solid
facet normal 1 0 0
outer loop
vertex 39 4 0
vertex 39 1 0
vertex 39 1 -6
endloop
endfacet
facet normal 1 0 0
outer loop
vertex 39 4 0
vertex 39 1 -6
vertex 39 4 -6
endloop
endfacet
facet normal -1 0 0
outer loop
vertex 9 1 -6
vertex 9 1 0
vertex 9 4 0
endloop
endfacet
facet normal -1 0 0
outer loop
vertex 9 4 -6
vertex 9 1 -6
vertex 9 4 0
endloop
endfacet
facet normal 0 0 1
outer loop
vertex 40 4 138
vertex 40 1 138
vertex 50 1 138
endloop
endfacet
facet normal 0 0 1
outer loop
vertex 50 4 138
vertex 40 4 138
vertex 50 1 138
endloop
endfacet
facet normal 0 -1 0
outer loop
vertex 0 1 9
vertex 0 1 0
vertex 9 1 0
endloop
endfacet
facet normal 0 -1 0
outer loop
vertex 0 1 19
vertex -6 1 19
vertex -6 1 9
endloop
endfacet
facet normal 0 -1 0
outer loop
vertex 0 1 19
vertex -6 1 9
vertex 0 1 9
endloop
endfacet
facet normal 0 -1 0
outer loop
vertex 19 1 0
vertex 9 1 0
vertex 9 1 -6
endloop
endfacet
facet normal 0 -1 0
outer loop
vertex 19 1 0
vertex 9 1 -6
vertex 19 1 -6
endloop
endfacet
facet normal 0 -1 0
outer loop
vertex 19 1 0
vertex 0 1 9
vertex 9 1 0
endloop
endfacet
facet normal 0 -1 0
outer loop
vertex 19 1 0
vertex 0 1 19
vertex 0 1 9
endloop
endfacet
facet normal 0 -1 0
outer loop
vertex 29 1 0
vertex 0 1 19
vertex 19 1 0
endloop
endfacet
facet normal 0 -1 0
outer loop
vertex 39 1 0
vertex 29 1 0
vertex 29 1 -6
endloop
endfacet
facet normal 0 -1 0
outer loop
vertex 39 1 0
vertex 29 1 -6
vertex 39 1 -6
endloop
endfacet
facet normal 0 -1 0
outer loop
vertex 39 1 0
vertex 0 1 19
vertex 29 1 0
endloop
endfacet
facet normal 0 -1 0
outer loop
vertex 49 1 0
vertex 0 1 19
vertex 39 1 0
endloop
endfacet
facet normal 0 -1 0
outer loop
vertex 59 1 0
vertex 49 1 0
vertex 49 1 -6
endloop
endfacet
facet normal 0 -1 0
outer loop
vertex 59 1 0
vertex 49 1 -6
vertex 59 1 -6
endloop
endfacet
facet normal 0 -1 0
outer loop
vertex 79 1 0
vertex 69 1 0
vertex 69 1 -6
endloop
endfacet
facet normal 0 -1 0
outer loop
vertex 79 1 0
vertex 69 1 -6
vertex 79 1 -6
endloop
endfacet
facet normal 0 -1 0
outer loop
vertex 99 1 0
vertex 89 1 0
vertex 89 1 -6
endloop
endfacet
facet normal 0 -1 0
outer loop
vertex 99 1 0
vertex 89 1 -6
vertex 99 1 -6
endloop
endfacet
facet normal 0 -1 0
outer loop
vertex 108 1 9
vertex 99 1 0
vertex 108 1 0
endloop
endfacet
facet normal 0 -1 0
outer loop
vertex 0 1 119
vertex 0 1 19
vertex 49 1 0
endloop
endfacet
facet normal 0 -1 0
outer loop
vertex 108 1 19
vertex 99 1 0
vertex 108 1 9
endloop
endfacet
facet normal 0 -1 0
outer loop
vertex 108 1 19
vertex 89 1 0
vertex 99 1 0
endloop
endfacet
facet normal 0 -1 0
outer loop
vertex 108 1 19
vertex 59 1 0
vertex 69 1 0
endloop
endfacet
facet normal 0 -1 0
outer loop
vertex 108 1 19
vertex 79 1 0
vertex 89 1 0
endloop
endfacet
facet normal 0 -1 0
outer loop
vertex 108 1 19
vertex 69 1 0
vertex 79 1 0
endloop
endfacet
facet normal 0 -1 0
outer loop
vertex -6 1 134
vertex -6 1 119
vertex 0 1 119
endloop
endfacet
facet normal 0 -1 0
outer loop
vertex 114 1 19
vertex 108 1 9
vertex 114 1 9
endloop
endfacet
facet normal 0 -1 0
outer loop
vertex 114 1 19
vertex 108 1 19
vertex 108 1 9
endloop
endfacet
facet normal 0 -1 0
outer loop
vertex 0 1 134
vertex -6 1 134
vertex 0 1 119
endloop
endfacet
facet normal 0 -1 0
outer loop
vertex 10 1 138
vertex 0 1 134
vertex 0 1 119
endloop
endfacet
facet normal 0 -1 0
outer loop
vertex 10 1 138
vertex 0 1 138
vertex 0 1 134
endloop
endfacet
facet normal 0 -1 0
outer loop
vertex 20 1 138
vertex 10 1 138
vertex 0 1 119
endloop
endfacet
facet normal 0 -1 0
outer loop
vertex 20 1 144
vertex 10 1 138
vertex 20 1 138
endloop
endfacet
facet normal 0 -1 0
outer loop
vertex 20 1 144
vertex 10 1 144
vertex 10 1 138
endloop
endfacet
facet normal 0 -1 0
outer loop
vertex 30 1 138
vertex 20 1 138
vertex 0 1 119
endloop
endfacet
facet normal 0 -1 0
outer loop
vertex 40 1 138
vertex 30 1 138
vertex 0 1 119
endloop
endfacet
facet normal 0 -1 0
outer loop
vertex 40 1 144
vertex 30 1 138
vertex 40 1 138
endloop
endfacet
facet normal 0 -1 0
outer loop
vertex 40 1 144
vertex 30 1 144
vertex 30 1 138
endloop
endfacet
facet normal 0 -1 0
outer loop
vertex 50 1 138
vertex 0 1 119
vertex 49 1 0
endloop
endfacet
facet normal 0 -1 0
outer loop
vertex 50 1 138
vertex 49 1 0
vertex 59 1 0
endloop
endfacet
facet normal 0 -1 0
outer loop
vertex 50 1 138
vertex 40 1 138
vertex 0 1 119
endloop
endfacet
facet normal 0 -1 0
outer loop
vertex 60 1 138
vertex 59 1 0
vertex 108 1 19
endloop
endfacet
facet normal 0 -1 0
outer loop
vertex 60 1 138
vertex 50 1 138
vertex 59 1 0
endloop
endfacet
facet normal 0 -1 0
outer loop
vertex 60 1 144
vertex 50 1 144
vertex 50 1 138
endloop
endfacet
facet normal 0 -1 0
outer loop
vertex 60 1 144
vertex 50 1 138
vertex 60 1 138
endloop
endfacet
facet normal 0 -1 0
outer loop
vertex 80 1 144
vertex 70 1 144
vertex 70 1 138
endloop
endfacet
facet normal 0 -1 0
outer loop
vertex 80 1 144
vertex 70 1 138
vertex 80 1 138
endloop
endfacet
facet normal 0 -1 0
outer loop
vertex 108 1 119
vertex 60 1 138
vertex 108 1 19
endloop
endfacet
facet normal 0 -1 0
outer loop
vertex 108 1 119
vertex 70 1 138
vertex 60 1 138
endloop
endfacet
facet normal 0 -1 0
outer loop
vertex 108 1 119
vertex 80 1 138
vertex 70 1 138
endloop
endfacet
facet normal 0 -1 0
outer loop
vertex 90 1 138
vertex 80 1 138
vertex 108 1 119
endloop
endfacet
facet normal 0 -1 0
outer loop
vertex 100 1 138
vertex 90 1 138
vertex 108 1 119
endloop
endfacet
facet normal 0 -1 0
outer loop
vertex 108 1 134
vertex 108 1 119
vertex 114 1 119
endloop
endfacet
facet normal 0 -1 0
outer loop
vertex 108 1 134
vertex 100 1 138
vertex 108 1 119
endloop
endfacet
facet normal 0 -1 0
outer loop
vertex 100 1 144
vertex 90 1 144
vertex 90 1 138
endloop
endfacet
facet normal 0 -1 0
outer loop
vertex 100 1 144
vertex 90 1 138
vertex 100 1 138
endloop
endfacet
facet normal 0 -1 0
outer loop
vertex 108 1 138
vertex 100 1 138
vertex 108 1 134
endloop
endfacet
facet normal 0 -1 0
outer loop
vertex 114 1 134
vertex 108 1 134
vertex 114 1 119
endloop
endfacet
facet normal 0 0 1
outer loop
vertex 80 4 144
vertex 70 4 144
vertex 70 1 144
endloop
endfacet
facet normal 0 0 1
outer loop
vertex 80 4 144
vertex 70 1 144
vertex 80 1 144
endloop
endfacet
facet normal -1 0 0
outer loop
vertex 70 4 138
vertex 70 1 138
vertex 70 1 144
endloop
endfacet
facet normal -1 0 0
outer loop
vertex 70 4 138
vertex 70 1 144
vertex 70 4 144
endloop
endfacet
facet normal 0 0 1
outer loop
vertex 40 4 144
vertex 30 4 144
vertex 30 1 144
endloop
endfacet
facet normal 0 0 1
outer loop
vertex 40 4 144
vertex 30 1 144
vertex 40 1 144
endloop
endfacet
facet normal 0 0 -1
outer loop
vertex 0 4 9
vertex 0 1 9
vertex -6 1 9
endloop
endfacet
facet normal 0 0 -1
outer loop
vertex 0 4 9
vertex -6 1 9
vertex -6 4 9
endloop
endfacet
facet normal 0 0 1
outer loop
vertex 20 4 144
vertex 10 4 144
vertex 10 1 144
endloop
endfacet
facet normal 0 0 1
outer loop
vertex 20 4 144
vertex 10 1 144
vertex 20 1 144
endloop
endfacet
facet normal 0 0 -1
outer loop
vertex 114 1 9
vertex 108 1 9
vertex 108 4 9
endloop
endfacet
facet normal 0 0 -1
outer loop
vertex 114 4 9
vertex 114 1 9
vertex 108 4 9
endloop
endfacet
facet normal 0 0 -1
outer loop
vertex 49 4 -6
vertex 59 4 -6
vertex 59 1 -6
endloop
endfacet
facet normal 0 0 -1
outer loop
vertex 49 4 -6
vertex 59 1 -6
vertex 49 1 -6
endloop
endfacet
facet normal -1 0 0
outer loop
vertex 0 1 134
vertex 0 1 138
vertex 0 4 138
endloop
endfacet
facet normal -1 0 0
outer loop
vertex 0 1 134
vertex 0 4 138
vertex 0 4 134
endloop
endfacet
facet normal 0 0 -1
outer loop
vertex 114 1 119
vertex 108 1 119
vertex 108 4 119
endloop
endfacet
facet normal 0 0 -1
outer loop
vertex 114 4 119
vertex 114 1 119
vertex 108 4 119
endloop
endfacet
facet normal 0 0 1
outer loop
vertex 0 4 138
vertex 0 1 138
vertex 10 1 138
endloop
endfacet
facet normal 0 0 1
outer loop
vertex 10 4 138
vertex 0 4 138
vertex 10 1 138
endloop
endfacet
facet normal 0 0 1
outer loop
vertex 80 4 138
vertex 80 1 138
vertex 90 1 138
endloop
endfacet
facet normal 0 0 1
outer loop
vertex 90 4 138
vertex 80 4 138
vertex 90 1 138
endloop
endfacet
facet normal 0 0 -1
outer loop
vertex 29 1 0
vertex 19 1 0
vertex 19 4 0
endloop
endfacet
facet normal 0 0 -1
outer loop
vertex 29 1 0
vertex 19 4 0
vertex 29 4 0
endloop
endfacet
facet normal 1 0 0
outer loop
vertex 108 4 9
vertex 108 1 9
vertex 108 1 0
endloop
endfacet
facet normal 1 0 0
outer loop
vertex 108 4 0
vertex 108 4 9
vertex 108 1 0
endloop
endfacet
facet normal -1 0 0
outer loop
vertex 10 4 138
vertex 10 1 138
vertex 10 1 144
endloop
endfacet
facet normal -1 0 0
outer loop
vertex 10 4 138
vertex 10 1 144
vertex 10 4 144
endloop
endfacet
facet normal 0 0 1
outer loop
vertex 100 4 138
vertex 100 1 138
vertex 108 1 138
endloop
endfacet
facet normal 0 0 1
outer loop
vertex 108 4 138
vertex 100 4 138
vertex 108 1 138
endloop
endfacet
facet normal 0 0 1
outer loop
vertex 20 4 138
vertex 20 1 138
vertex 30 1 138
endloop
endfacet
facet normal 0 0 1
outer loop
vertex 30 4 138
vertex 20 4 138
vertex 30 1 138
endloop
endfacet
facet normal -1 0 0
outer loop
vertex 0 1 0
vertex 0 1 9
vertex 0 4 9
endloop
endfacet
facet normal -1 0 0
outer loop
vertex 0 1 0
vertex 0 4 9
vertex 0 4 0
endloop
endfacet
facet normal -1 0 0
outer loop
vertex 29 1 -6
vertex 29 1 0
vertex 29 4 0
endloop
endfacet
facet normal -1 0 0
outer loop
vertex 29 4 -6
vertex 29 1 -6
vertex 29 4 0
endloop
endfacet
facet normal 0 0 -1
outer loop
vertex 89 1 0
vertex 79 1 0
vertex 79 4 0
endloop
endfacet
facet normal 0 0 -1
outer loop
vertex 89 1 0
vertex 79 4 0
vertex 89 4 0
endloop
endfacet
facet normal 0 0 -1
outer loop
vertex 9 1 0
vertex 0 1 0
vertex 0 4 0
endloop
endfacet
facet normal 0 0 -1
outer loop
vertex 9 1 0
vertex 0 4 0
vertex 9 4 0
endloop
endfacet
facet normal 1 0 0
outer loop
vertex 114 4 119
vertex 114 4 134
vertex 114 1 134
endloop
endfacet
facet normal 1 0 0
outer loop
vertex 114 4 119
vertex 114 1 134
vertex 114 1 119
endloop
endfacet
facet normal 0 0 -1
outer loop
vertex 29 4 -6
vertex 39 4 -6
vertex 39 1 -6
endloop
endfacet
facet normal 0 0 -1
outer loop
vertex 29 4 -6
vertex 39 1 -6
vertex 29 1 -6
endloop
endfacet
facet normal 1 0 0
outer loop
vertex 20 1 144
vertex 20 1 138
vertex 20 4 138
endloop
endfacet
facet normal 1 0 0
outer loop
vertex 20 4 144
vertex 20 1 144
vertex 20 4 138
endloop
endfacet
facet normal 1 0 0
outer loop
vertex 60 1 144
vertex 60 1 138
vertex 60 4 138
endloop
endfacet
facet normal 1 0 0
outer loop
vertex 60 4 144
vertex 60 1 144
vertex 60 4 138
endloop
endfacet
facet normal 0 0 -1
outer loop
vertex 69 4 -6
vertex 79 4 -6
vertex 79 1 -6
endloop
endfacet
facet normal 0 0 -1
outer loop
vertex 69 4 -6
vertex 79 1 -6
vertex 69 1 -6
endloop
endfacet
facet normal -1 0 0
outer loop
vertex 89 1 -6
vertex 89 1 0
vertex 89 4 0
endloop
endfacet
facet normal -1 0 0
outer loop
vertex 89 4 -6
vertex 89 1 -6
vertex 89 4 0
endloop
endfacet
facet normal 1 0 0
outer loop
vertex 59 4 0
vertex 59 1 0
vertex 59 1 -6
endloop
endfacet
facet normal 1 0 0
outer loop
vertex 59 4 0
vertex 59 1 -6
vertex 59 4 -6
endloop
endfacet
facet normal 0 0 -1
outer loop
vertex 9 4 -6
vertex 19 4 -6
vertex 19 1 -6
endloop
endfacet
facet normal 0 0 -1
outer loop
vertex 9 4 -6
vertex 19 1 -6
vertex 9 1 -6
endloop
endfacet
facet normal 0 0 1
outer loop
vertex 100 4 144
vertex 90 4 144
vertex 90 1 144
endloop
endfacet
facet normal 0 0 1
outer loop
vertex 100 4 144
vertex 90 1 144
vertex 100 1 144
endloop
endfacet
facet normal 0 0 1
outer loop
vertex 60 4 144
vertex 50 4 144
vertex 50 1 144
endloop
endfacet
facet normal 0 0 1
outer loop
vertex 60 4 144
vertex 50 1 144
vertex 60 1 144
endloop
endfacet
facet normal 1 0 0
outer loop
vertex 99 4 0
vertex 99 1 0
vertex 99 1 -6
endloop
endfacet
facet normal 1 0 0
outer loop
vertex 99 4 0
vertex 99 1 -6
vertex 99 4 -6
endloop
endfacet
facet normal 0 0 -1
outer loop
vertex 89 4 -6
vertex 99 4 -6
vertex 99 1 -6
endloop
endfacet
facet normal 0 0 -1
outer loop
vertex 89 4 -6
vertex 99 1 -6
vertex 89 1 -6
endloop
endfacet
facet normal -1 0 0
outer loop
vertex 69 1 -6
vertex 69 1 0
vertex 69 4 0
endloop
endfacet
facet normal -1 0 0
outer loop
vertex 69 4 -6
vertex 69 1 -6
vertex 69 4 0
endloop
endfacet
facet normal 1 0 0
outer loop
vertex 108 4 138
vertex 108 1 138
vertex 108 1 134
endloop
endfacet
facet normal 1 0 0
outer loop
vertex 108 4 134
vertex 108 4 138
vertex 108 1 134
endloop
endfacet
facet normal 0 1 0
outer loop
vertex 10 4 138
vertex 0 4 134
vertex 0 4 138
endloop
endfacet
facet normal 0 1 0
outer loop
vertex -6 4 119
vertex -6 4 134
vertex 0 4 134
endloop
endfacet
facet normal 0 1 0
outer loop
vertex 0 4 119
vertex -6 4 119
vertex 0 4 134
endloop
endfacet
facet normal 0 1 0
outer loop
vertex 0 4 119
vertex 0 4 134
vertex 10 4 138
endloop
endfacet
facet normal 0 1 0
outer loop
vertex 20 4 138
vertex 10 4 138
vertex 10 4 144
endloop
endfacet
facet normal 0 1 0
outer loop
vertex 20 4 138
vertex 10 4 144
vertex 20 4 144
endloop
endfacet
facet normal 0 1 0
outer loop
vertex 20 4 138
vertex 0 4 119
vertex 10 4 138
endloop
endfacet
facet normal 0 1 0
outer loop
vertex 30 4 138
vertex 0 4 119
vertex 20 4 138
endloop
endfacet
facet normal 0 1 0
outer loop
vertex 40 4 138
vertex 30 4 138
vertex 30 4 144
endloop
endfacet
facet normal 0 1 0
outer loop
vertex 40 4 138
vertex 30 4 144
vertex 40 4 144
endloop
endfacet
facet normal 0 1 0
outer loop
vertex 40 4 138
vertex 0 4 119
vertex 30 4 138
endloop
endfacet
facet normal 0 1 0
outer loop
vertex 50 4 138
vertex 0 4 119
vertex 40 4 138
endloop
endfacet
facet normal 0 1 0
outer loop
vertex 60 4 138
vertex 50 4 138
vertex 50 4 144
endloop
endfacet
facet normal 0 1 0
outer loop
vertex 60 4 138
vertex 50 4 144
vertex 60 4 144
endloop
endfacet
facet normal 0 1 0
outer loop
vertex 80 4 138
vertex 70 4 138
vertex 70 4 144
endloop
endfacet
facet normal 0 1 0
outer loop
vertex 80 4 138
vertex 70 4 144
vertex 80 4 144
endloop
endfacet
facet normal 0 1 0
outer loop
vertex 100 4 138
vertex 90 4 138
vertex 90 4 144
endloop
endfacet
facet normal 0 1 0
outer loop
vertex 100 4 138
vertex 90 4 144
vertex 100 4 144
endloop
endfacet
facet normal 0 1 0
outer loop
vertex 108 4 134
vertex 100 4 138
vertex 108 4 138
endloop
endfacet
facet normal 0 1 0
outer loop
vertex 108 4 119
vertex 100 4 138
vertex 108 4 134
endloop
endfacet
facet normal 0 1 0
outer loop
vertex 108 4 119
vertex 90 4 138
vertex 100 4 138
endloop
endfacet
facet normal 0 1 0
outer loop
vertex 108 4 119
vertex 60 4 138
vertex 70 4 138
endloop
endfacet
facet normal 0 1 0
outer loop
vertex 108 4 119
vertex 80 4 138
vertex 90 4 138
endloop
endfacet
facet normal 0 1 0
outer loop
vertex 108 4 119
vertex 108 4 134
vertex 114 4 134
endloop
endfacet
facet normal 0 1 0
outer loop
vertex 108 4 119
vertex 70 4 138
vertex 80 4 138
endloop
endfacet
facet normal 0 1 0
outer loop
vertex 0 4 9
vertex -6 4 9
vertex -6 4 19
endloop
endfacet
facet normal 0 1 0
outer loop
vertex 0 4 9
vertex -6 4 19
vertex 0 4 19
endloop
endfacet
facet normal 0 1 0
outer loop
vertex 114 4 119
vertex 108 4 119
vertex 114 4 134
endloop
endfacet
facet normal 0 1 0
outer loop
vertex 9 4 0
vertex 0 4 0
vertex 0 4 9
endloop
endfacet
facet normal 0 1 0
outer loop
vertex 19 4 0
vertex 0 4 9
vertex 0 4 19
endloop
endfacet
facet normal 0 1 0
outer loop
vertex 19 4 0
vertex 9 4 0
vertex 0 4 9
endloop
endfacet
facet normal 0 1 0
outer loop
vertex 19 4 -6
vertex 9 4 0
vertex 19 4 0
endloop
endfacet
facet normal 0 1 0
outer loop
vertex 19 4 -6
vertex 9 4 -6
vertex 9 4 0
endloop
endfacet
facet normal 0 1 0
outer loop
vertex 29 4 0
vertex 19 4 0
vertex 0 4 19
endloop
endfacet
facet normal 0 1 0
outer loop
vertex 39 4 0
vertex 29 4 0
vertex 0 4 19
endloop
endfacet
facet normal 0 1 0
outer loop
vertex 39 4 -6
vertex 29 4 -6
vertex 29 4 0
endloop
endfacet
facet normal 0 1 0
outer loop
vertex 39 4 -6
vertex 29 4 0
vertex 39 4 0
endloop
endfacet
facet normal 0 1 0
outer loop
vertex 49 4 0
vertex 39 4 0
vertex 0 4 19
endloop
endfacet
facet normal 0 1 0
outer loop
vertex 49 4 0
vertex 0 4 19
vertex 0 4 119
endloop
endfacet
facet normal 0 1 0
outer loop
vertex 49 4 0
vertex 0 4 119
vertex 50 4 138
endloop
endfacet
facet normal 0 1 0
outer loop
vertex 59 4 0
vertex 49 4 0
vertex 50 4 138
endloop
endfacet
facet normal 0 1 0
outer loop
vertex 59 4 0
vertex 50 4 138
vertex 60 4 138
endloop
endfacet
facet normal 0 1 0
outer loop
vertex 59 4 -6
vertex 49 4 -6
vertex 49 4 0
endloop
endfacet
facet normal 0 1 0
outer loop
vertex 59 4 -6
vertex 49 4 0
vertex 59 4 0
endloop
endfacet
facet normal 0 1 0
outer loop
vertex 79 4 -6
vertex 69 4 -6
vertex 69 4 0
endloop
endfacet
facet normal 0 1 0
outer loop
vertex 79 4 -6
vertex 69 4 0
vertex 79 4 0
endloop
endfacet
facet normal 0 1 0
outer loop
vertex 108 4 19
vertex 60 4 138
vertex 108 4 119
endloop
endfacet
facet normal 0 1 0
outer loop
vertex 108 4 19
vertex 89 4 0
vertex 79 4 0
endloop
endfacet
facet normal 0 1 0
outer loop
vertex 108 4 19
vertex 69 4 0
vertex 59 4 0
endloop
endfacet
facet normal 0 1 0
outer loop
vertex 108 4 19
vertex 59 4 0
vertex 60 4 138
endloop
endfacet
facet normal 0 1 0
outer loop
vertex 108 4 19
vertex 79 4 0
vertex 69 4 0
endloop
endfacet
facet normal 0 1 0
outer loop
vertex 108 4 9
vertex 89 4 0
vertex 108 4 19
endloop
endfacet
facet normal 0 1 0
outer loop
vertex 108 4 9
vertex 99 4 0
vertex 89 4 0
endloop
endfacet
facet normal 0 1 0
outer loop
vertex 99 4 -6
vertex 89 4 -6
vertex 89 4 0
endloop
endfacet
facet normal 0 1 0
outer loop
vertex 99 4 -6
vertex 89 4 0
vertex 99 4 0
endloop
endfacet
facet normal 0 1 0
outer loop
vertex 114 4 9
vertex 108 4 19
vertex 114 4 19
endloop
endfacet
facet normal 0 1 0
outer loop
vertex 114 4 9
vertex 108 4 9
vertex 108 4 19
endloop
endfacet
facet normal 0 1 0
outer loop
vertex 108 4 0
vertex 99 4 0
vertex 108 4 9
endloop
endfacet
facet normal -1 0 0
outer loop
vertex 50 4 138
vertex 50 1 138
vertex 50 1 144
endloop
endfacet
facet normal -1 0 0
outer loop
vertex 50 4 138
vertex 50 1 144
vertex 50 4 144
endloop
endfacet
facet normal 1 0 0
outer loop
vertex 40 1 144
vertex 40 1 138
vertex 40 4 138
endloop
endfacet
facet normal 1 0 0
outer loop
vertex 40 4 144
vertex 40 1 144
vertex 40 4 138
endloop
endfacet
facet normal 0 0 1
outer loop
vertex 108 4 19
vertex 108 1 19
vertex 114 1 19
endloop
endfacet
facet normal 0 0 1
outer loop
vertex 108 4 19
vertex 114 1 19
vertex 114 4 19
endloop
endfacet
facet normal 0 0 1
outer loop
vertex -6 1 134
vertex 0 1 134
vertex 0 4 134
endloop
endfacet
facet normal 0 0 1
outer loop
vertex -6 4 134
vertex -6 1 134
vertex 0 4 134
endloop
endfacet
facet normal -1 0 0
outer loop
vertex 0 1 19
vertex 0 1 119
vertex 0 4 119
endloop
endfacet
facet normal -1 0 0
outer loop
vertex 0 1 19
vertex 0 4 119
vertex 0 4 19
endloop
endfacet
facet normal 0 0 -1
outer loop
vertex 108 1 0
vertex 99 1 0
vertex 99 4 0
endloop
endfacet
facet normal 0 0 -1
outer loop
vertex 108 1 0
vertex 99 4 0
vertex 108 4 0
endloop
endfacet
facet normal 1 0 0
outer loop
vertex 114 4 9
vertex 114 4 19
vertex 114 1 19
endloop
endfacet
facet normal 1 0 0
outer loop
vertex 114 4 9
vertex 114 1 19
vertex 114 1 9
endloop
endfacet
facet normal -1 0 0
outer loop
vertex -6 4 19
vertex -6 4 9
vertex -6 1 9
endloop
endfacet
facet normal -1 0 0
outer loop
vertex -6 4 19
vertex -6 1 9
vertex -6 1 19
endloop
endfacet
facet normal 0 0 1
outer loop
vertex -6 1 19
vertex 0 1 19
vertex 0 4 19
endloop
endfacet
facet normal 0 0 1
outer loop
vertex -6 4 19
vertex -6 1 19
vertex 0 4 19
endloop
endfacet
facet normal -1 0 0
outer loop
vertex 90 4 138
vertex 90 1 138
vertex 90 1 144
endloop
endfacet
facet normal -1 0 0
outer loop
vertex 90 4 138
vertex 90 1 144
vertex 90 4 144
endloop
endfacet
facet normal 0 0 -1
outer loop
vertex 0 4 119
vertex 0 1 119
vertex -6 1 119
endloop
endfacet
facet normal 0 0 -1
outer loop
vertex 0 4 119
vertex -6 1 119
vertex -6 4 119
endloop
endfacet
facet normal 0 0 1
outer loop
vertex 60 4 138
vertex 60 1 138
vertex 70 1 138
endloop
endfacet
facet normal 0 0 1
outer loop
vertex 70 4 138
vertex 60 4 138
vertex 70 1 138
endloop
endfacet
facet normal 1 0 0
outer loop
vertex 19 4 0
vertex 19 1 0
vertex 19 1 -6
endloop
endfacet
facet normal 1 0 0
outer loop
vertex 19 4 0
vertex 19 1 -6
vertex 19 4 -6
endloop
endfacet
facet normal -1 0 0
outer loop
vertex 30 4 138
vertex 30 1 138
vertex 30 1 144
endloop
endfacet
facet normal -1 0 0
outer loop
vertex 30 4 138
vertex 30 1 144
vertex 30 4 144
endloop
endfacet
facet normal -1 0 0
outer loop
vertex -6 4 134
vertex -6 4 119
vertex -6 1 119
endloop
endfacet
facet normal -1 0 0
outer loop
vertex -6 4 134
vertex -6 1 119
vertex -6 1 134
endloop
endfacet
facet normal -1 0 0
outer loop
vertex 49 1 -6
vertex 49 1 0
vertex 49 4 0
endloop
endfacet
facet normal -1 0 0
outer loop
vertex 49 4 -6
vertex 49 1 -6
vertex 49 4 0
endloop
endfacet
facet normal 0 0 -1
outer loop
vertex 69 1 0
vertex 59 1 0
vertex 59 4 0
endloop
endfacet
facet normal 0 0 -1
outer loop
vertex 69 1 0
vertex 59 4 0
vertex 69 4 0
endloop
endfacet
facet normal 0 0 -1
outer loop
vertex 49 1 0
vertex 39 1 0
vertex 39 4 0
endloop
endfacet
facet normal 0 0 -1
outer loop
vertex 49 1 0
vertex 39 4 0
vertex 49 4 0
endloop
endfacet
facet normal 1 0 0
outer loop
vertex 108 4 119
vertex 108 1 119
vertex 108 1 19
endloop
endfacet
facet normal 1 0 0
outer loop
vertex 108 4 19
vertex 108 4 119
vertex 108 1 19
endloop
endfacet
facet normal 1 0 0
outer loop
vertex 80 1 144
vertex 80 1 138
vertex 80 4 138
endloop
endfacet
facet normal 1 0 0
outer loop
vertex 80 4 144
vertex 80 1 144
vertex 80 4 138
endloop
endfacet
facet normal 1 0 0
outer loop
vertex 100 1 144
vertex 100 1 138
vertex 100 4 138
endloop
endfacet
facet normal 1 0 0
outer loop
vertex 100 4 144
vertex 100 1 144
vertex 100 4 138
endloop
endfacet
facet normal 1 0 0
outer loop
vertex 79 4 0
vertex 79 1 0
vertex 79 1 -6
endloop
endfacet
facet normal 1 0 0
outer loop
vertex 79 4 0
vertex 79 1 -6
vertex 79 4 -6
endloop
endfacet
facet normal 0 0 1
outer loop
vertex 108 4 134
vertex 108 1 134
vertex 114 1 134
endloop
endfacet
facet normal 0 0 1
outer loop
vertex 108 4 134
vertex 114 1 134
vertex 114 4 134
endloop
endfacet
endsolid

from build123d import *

# Parameters (mm, degrees)
SKETCH_1_W          = 108
SKETCH_1_H          = 138
EXTRUDE_1_DEPTH     = 4
SKETCH_3_W          = 108
SKETCH_3_H          = 138
CUT_EXTRUDE_2_DEPTH = 1
SKETCH_4_W          = 10
SKETCH_4_H          = 3
EXTRUDE_2_DEPTH     = 6
SKETCH_5_W          = 10
SKETCH_5_H          = 3
SKETCH_5_W_2        = 15
EXTRUDE_3_DEPTH     = 6
SKETCH_6_W          = 15
SKETCH_6_H          = 3
SKETCH_6_W_2        = 10
EXTRUDE_4_DEPTH     = 6
SKETCH_7_W          = 10
SKETCH_7_H          = 3
EXTRUDE_5_DEPTH     = 6


with BuildPart() as part:
    # Эскиз1 → Бобышка-Вытянуть1 (new body)
    with BuildSketch(Plane(origin=(0, 0, 0), x_dir=(1, 0, 0), z_dir=(0, 1, 0))):
        with Locations((54, -69)):
            Rectangle(SKETCH_1_W, SKETCH_1_H)
    extrude(amount=EXTRUDE_1_DEPTH)

    # Эскиз3 → Вырез-Вытянуть2 (cut)
    with BuildSketch(Plane.XZ):
        with Locations((54, 69)):
            Rectangle(SKETCH_3_W, SKETCH_3_H)
    extrude(amount=-CUT_EXTRUDE_2_DEPTH, mode=Mode.SUBTRACT)

    # Эскиз4 → Бобышка-Вытянуть2 (add)
    with BuildSketch(Plane.XY.offset(138)):
        with Locations((15, 2.5)):
            Rectangle(SKETCH_4_W, SKETCH_4_H)
        with Locations((35, 2.5)):
            Rectangle(SKETCH_4_W, SKETCH_4_H)
        with Locations((55, 2.5)):
            Rectangle(SKETCH_4_W, SKETCH_4_H)
        with Locations((75, 2.5)):
            Rectangle(SKETCH_4_W, SKETCH_4_H)
        with Locations((95, 2.5)):
            Rectangle(SKETCH_4_W, SKETCH_4_H)
    extrude(amount=EXTRUDE_2_DEPTH)

    # Эскиз5 → Бобышка-Вытянуть3 (add)
    with BuildSketch(Plane.ZY):
        with Locations((14, 2.5)):
            Rectangle(SKETCH_5_W, SKETCH_5_H)
        with Locations((126.5, 2.5)):
            Rectangle(SKETCH_5_W_2, SKETCH_5_H)
    extrude(amount=EXTRUDE_3_DEPTH)

    # Эскиз6 → Бобышка-Вытянуть4 (add)
    with BuildSketch(Plane(origin=(108, 0, 0), x_dir=(0, 0, -1), z_dir=(1, 0, 0))):
        with Locations((-126.5, 2.5)):
            Rectangle(SKETCH_6_W, SKETCH_6_H)
        with Locations((-14, 2.5)):
            Rectangle(SKETCH_6_W_2, SKETCH_6_H)
    extrude(amount=EXTRUDE_4_DEPTH)

    # Эскиз7 → Бобышка-Вытянуть5 (add)
    with BuildSketch(Plane(origin=(0, 0, 0), x_dir=(-1, 0, 0), z_dir=(0, 0, -1))):
        with Locations((-94, 2.5)):
            Rectangle(SKETCH_7_W, SKETCH_7_H)
        with Locations((-74, 2.5)):
            Rectangle(SKETCH_7_W, SKETCH_7_H)
        with Locations((-54, 2.5)):
            Rectangle(SKETCH_7_W, SKETCH_7_H)
        with Locations((-34, 2.5)):
            Rectangle(SKETCH_7_W, SKETCH_7_H)
        with Locations((-14, 2.5)):
            Rectangle(SKETCH_7_W, SKETCH_7_H)
    extrude(amount=EXTRUDE_5_DEPTH)


solid = part.part
